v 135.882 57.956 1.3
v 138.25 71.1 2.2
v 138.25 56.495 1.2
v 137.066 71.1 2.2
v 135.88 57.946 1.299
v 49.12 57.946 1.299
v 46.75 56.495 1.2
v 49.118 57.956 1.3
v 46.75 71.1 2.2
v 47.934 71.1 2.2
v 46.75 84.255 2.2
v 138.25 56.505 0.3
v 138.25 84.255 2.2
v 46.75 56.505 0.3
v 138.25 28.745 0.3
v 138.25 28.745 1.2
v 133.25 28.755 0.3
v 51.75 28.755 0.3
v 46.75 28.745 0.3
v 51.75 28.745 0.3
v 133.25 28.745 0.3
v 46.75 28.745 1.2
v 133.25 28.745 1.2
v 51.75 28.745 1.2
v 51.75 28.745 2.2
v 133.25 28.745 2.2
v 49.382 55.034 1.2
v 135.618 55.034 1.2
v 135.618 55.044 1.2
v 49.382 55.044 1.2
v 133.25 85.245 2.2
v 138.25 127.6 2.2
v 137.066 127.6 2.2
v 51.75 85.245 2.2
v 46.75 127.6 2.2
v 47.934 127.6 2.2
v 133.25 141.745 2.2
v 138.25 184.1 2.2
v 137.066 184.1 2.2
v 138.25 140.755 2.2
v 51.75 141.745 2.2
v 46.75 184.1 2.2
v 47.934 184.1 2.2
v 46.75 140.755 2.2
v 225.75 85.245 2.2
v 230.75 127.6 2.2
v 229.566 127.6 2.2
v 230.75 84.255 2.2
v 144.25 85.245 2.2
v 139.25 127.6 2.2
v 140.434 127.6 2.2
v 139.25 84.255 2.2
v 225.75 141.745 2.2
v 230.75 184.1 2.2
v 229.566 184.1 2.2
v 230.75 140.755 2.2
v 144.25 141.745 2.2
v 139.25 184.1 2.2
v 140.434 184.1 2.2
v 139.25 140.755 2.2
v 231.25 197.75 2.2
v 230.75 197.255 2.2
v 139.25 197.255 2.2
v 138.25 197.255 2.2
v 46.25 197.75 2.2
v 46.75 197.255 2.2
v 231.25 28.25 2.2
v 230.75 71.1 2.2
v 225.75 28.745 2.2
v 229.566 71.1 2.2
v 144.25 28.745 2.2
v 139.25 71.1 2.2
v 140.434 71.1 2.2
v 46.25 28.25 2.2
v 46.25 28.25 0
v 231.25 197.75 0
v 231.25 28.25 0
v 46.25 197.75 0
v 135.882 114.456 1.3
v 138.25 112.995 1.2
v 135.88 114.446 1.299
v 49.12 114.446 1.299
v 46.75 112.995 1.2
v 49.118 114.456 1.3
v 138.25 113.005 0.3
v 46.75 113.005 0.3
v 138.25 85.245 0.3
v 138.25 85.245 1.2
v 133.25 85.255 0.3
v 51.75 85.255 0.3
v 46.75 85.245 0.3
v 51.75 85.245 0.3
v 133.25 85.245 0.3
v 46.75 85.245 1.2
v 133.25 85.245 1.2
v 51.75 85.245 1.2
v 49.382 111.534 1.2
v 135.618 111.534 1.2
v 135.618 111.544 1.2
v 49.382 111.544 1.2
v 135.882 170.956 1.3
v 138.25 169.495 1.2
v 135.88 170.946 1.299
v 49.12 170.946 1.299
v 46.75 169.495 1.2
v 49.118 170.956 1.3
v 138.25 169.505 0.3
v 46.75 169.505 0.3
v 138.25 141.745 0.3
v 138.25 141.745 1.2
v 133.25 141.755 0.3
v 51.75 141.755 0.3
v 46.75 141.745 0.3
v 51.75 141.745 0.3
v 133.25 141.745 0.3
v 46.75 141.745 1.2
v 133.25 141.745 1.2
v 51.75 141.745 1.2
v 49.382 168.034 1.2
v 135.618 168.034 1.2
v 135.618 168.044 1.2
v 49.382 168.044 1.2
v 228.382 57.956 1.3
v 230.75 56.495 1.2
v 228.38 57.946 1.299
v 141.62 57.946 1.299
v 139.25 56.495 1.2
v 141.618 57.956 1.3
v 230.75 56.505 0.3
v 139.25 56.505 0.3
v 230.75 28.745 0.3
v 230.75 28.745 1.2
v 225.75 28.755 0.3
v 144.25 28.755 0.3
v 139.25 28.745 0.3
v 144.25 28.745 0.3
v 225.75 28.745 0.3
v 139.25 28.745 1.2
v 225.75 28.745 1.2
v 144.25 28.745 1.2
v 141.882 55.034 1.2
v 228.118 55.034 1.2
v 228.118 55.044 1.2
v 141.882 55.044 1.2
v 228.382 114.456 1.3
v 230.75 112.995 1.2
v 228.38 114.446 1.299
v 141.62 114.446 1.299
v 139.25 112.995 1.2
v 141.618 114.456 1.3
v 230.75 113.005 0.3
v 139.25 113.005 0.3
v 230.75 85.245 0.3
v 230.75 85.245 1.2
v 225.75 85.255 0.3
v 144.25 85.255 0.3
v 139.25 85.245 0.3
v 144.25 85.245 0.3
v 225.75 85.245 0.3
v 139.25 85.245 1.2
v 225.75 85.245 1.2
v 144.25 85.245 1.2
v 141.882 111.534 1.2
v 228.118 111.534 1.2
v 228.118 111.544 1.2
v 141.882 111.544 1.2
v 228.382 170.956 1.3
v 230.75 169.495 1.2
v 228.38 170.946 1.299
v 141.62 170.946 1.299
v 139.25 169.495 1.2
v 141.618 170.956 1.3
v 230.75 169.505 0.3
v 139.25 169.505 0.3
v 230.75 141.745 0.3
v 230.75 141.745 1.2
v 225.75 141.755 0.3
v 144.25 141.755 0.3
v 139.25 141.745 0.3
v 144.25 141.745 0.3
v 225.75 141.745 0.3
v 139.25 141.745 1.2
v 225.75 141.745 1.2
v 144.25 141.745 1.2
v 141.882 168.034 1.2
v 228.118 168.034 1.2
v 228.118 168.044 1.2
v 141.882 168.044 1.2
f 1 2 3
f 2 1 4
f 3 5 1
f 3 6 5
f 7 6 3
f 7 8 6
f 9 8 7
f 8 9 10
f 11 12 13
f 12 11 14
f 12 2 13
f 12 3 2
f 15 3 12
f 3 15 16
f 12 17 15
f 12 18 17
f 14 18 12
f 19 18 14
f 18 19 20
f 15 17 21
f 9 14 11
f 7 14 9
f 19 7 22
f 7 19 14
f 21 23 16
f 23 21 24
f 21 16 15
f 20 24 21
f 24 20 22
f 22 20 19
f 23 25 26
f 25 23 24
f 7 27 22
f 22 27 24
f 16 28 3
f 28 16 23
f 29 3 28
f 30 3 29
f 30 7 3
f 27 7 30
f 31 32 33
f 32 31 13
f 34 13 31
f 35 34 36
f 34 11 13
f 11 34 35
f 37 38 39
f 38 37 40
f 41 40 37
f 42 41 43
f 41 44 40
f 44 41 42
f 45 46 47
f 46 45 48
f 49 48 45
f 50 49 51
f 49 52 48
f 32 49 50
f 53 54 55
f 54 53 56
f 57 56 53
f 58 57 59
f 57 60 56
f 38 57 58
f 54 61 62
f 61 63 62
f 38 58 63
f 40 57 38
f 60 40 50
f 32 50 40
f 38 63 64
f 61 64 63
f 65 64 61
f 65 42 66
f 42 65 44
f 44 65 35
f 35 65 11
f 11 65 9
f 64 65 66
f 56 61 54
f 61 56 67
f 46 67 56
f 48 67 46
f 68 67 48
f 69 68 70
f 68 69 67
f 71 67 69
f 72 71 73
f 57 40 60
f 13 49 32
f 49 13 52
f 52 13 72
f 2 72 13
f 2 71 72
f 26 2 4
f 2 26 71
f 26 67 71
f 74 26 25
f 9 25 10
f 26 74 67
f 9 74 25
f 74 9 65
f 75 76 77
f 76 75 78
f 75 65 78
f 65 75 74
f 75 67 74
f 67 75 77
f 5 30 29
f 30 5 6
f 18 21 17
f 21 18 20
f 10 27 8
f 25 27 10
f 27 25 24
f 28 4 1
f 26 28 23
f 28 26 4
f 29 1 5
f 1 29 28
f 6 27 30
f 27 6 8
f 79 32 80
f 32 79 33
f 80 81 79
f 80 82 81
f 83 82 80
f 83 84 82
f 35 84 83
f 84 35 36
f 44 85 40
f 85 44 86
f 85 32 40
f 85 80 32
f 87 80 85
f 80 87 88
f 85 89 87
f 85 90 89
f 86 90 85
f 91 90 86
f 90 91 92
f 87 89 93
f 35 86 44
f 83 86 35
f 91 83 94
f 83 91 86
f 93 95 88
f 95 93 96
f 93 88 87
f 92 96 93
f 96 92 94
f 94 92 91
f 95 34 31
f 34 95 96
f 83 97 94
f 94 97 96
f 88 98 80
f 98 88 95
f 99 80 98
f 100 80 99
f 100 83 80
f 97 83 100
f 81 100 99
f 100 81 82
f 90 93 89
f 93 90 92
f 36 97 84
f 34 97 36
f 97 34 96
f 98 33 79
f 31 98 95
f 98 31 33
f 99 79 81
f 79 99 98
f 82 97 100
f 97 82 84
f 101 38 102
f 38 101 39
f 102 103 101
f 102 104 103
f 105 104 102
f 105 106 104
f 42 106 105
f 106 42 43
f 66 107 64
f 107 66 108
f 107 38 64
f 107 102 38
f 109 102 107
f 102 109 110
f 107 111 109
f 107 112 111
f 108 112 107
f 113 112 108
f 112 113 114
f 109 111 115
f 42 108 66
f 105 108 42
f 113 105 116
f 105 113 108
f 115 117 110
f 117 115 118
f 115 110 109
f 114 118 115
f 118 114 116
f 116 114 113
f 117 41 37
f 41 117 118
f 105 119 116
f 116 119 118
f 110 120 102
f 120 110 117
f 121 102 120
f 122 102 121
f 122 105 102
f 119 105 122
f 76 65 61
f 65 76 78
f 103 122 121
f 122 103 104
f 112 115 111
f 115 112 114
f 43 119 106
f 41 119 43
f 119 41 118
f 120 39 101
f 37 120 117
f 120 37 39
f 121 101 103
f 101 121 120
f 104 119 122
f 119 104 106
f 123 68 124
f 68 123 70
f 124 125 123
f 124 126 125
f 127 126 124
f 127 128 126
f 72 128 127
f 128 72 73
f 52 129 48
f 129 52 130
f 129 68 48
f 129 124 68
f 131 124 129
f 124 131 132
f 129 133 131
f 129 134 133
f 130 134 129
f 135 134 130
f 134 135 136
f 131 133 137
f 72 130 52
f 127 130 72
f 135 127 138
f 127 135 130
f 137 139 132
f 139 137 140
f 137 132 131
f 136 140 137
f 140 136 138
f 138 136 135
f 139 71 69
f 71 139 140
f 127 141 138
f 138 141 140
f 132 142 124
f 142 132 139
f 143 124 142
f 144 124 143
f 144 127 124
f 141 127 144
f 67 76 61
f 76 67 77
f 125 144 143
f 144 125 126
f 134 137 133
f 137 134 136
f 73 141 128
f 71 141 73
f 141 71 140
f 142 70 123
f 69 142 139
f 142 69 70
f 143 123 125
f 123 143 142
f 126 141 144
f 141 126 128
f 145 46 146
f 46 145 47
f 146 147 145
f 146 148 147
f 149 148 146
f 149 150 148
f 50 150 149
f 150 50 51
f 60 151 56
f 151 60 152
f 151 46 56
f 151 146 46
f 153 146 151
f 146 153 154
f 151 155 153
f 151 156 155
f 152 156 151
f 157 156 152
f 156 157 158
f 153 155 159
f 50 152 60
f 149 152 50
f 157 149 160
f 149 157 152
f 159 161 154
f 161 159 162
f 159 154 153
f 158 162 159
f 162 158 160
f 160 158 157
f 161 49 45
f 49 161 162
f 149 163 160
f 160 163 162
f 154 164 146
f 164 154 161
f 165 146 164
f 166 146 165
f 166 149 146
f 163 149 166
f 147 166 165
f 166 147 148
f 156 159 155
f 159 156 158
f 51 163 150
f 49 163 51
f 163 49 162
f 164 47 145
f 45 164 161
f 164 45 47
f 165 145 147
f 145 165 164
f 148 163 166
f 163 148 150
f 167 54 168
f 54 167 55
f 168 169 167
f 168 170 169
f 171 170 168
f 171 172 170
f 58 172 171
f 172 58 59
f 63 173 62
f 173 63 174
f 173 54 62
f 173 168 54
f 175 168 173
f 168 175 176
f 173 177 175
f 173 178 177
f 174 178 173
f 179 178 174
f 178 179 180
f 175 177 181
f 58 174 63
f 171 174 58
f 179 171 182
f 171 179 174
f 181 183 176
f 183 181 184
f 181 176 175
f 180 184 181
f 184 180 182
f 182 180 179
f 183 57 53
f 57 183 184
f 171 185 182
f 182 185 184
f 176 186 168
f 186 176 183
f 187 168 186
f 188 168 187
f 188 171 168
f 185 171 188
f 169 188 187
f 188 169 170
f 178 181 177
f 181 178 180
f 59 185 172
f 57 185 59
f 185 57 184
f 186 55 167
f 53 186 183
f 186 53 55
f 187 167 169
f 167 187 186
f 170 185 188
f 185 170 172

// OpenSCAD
// Wall Mounted Single Card Holder
// By Brian Khuu 2022-04-10

print_layer_height = 0.2;

// Businesscard
// Default values based on https://www.mbe.com.au/what-is-the-standard-business-card-size-in-australia/
businesscard_width = 91.5; // 90mm but some in real life are more like 91mm (Plus 0.5 tol)
businesscard_height = 55.5; // 55mm (add 0.5mm tol)
businesscard_thickness = 0.9; // 0.25mm for thin paper cards. 0.8mm for thick plastic cards

// Holder
wall_spacing = 1;
wall_card_grip = 10;

// Calc
wall_base = print_layer_height+0.1;
wall_top = print_layer_height*2+0.1;
wall_height = wall_base + businesscard_thickness + wall_top*2;


if (0)
translate([0,0,2])
    %cube([businesscard_width, businesscard_height, 1], center = true);



module cardholder(reducePlastic=false)
{
    difference()
    {
        translate([0,0,wall_height/2])
            cube([businesscard_width+wall_spacing, businesscard_height+wall_spacing, wall_height], center = true);

        // Reduce Plastic and print time
        if (reducePlastic)
        {
            translate([0,0,wall_height/2])
                cube([businesscard_width*0.8, businesscard_height*0.8, wall_height*3], center = true);
        }
        
        // Card Slide
        translate([0,0,wall_base])
        translate([0,0,businesscard_thickness/2])
        {
            hull()
            {
                translate([0,businesscard_height/2,businesscard_thickness + wall_top*2])
                cube([businesscard_width, 0.01, businesscard_thickness], center = true);
                
                translate([0,0,0])
                cube([businesscard_width, 0.01, businesscard_thickness], center = true);
            }
            hull()
            {
                translate([0,-businesscard_height/2,0])
                cube([businesscard_width, 0.01, businesscard_thickness], center = true);
                
                cube([businesscard_width, 0.01, businesscard_thickness], center = true);
            }
        }
        
        // Card Window
        translate([0,0,wall_base])
        translate([0,0,businesscard_thickness/2])
        {
            hull()
            {
                translate([0,0,0])
                union()
                {
                    translate([0,businesscard_height/2,businesscard_thickness + wall_top*2])
                    cube([businesscard_width, 0.01, businesscard_thickness], center = true);
                    translate([0,-businesscard_height/2,0])
                    cube([businesscard_width-wall_card_grip, 0.01, businesscard_thickness], center = true);
                }
                translate([0,0,businesscard_thickness + wall_top*2])
                union()
                {
                    translate([0,businesscard_height/2,businesscard_thickness + wall_top*2])
                    cube([businesscard_width, 0.01, businesscard_thickness], center = true);
                    translate([0,-businesscard_height/2,0])
                    cube([businesscard_width-wall_card_grip, 0.01, businesscard_thickness], center = true);
                }
            }
        }
    }
}

for (x = [1: 1 : 2])
    for (y = [1 : 1 : 3])
       translate([x*(businesscard_width+wall_spacing), y*(businesscard_height+wall_spacing), 0])
            cardholder();

    
    
    
